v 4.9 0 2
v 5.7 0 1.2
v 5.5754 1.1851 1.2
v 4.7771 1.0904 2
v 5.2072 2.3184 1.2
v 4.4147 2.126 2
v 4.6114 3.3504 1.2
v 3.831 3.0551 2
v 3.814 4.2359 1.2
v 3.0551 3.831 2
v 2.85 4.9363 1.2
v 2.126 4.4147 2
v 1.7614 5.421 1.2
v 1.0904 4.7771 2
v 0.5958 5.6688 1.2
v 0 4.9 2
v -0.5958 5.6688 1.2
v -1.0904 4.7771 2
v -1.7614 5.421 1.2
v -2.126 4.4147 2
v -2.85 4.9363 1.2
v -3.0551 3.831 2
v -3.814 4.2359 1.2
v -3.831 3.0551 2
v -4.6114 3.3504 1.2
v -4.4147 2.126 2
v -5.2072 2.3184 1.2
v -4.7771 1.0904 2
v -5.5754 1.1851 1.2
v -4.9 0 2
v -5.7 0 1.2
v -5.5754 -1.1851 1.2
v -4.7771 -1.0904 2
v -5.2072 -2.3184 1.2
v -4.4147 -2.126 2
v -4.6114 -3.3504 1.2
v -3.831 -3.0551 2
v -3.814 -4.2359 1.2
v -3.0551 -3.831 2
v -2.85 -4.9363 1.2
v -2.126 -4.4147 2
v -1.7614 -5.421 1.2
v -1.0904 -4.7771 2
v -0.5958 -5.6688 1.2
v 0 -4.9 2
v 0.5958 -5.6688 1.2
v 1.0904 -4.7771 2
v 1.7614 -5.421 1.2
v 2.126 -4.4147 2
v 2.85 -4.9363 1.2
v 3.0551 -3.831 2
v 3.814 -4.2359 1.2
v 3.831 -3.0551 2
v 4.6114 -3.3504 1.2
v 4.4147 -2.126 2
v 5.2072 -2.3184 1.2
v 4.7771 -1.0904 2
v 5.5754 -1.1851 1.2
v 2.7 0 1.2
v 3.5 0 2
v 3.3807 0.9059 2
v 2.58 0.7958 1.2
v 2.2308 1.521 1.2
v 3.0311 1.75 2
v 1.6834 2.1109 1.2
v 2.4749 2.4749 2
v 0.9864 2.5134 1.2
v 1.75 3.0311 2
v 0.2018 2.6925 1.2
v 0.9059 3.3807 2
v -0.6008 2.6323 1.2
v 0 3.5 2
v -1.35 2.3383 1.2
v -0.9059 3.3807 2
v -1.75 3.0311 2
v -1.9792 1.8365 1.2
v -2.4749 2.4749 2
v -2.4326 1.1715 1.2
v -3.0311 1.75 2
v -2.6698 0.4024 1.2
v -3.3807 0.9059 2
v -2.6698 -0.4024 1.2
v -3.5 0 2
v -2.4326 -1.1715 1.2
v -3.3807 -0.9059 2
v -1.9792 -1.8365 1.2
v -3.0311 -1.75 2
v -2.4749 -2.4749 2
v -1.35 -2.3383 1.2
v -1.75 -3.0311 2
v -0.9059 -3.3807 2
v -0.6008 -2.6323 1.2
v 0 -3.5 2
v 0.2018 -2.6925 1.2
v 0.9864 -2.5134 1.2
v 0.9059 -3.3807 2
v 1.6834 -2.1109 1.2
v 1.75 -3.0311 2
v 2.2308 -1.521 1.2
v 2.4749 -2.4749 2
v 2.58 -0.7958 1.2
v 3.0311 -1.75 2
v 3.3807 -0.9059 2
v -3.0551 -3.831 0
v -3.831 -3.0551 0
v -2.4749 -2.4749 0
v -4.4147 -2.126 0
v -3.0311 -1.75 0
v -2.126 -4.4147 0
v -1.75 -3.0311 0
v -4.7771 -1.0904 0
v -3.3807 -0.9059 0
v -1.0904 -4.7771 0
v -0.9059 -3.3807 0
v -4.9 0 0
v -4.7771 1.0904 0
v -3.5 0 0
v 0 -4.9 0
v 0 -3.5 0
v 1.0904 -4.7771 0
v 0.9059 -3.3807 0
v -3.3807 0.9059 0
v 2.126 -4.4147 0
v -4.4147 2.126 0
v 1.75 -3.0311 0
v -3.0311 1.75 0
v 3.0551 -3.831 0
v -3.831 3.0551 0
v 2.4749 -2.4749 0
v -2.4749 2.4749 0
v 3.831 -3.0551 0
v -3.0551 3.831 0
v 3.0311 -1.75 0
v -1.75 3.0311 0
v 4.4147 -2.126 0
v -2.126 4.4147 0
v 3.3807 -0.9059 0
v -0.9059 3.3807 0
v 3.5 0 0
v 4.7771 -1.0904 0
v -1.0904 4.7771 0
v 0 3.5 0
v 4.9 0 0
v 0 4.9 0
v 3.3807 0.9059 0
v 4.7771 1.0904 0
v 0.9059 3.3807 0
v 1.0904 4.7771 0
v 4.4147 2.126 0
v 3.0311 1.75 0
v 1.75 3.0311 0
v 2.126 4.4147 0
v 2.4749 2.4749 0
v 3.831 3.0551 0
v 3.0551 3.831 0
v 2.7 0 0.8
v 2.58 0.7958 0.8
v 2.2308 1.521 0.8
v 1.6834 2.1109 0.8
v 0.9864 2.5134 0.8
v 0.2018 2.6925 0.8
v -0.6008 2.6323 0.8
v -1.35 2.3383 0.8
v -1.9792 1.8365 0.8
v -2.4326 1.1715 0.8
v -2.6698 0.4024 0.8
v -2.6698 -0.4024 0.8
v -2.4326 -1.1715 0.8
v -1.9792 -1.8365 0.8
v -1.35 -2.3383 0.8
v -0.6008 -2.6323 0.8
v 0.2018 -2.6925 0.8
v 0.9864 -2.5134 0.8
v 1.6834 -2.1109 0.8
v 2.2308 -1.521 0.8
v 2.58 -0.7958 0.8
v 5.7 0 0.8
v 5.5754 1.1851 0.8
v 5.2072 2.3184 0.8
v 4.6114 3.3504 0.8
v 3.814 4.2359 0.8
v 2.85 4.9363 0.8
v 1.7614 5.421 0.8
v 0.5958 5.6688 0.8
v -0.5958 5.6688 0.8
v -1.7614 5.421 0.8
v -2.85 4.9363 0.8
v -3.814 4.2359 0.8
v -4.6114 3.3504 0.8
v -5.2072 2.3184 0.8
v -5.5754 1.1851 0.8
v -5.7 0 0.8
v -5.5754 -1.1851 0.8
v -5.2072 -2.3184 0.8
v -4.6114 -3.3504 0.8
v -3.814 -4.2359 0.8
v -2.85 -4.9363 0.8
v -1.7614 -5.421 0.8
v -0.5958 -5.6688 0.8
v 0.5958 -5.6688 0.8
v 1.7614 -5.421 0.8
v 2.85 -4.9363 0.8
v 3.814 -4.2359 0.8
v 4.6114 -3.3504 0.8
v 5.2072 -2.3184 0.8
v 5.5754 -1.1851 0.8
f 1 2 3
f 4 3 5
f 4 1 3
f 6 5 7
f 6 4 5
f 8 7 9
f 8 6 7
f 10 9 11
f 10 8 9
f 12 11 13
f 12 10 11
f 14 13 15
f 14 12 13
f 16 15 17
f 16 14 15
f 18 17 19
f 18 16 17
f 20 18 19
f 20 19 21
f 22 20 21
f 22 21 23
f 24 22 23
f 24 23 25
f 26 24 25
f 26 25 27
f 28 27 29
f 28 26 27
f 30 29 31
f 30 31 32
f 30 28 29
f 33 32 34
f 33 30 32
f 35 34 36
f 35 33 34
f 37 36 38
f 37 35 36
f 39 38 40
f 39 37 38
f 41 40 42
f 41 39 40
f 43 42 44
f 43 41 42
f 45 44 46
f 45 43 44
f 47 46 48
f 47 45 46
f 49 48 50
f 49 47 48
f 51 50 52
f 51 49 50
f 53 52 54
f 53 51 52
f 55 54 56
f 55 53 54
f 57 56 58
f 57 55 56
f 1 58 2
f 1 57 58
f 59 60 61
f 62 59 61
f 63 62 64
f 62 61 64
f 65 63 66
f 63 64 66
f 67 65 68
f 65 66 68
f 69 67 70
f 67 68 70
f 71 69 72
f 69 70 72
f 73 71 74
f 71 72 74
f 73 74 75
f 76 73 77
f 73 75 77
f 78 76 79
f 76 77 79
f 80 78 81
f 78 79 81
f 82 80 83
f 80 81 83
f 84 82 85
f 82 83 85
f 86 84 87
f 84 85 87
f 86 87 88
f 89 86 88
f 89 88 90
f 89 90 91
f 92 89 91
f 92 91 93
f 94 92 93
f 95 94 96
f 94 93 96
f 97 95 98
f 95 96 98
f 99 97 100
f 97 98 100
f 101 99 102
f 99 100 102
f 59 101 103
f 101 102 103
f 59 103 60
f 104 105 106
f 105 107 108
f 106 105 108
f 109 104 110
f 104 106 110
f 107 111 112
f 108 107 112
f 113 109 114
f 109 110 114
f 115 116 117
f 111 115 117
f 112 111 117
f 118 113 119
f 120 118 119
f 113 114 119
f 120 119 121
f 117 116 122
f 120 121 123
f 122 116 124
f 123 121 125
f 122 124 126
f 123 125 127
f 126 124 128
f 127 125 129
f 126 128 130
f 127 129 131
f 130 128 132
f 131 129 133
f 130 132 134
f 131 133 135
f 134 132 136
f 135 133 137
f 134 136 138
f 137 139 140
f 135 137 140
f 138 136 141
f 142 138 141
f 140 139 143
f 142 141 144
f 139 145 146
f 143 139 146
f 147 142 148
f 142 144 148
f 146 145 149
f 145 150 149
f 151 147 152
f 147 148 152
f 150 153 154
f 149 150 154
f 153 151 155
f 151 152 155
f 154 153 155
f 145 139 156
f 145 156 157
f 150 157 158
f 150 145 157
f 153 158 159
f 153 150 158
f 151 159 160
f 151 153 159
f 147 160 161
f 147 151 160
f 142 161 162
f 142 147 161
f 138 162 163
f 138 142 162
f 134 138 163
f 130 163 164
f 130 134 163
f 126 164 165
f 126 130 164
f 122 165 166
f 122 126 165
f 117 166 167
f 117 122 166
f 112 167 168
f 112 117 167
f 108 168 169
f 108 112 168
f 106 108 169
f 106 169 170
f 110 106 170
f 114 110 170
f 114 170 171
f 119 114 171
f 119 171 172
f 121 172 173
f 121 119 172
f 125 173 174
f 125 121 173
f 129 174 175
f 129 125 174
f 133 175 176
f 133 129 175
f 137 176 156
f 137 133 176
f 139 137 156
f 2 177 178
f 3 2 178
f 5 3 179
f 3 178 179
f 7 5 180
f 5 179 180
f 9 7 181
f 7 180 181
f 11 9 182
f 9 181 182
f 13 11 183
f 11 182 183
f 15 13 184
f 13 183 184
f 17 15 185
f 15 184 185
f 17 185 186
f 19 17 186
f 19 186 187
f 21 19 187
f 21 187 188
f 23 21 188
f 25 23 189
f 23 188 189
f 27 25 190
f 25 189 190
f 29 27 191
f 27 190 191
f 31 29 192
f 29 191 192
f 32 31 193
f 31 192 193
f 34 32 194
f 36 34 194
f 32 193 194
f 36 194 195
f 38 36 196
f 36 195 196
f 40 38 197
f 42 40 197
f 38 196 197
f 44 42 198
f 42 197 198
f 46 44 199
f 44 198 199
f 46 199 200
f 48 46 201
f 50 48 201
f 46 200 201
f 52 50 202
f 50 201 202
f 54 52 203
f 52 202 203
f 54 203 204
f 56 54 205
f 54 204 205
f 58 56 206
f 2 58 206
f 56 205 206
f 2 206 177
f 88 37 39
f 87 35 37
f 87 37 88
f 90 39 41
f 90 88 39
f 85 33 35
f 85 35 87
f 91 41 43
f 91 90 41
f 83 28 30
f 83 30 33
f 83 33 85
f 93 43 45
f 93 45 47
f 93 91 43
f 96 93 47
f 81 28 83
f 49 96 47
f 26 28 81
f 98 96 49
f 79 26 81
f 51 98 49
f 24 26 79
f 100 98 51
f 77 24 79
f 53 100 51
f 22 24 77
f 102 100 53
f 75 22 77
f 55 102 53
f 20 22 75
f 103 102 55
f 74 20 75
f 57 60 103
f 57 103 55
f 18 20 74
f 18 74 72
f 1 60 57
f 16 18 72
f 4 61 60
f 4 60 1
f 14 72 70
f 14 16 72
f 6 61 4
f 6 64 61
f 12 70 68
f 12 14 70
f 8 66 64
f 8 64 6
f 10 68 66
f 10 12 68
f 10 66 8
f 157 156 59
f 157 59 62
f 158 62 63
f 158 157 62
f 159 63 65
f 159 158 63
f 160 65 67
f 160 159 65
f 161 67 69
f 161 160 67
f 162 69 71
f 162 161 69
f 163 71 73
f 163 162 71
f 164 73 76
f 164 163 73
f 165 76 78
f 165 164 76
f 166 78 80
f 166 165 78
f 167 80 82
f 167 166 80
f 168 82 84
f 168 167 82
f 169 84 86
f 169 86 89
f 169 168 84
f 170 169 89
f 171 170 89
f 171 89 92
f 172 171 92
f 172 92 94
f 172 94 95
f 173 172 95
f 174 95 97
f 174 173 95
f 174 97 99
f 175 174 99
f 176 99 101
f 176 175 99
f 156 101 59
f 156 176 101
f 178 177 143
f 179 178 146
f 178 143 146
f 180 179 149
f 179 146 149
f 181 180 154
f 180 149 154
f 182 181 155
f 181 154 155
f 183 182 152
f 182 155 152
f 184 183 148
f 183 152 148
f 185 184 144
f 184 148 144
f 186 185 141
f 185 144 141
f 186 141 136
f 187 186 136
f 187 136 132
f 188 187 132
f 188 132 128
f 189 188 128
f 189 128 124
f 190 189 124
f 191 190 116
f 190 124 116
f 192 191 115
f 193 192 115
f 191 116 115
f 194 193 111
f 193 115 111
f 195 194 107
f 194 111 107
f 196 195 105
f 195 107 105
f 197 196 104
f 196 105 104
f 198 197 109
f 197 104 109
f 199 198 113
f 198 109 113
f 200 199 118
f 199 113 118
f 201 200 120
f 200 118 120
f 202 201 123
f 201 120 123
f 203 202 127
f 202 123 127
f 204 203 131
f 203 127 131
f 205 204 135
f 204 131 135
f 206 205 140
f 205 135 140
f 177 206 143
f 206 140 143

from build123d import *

# Parameters (mm, degrees)
ESBO_O1_R                = 5.7
ESBO_O1_R_2              = 2.7
RESSALTO_EXTRUS_O1_DEPTH = 2
CHANFRO1_SIZE            = 0.8


with BuildPart() as part:
    # Esboço1 → Ressalto-extrusão1 (new body)
    with BuildSketch(Plane.XY):
        Circle(ESBO_O1_R)
        Circle(ESBO_O1_R_2, mode=Mode.SUBTRACT)
    extrude(amount=RESSALTO_EXTRUS_O1_DEPTH)

    # Chanfro1
    chanfro1_edges = [part.edges().sort_by_distance(p)[0] for p in [
        (-5.7, 0, 0),
        (-5.7, 0, 2),
        (-2.7, 0, 0),
        (-2.7, 0, 2),
    ]]
    chamfer(chanfro1_edges, length=CHANFRO1_SIZE)


solid = part.part
